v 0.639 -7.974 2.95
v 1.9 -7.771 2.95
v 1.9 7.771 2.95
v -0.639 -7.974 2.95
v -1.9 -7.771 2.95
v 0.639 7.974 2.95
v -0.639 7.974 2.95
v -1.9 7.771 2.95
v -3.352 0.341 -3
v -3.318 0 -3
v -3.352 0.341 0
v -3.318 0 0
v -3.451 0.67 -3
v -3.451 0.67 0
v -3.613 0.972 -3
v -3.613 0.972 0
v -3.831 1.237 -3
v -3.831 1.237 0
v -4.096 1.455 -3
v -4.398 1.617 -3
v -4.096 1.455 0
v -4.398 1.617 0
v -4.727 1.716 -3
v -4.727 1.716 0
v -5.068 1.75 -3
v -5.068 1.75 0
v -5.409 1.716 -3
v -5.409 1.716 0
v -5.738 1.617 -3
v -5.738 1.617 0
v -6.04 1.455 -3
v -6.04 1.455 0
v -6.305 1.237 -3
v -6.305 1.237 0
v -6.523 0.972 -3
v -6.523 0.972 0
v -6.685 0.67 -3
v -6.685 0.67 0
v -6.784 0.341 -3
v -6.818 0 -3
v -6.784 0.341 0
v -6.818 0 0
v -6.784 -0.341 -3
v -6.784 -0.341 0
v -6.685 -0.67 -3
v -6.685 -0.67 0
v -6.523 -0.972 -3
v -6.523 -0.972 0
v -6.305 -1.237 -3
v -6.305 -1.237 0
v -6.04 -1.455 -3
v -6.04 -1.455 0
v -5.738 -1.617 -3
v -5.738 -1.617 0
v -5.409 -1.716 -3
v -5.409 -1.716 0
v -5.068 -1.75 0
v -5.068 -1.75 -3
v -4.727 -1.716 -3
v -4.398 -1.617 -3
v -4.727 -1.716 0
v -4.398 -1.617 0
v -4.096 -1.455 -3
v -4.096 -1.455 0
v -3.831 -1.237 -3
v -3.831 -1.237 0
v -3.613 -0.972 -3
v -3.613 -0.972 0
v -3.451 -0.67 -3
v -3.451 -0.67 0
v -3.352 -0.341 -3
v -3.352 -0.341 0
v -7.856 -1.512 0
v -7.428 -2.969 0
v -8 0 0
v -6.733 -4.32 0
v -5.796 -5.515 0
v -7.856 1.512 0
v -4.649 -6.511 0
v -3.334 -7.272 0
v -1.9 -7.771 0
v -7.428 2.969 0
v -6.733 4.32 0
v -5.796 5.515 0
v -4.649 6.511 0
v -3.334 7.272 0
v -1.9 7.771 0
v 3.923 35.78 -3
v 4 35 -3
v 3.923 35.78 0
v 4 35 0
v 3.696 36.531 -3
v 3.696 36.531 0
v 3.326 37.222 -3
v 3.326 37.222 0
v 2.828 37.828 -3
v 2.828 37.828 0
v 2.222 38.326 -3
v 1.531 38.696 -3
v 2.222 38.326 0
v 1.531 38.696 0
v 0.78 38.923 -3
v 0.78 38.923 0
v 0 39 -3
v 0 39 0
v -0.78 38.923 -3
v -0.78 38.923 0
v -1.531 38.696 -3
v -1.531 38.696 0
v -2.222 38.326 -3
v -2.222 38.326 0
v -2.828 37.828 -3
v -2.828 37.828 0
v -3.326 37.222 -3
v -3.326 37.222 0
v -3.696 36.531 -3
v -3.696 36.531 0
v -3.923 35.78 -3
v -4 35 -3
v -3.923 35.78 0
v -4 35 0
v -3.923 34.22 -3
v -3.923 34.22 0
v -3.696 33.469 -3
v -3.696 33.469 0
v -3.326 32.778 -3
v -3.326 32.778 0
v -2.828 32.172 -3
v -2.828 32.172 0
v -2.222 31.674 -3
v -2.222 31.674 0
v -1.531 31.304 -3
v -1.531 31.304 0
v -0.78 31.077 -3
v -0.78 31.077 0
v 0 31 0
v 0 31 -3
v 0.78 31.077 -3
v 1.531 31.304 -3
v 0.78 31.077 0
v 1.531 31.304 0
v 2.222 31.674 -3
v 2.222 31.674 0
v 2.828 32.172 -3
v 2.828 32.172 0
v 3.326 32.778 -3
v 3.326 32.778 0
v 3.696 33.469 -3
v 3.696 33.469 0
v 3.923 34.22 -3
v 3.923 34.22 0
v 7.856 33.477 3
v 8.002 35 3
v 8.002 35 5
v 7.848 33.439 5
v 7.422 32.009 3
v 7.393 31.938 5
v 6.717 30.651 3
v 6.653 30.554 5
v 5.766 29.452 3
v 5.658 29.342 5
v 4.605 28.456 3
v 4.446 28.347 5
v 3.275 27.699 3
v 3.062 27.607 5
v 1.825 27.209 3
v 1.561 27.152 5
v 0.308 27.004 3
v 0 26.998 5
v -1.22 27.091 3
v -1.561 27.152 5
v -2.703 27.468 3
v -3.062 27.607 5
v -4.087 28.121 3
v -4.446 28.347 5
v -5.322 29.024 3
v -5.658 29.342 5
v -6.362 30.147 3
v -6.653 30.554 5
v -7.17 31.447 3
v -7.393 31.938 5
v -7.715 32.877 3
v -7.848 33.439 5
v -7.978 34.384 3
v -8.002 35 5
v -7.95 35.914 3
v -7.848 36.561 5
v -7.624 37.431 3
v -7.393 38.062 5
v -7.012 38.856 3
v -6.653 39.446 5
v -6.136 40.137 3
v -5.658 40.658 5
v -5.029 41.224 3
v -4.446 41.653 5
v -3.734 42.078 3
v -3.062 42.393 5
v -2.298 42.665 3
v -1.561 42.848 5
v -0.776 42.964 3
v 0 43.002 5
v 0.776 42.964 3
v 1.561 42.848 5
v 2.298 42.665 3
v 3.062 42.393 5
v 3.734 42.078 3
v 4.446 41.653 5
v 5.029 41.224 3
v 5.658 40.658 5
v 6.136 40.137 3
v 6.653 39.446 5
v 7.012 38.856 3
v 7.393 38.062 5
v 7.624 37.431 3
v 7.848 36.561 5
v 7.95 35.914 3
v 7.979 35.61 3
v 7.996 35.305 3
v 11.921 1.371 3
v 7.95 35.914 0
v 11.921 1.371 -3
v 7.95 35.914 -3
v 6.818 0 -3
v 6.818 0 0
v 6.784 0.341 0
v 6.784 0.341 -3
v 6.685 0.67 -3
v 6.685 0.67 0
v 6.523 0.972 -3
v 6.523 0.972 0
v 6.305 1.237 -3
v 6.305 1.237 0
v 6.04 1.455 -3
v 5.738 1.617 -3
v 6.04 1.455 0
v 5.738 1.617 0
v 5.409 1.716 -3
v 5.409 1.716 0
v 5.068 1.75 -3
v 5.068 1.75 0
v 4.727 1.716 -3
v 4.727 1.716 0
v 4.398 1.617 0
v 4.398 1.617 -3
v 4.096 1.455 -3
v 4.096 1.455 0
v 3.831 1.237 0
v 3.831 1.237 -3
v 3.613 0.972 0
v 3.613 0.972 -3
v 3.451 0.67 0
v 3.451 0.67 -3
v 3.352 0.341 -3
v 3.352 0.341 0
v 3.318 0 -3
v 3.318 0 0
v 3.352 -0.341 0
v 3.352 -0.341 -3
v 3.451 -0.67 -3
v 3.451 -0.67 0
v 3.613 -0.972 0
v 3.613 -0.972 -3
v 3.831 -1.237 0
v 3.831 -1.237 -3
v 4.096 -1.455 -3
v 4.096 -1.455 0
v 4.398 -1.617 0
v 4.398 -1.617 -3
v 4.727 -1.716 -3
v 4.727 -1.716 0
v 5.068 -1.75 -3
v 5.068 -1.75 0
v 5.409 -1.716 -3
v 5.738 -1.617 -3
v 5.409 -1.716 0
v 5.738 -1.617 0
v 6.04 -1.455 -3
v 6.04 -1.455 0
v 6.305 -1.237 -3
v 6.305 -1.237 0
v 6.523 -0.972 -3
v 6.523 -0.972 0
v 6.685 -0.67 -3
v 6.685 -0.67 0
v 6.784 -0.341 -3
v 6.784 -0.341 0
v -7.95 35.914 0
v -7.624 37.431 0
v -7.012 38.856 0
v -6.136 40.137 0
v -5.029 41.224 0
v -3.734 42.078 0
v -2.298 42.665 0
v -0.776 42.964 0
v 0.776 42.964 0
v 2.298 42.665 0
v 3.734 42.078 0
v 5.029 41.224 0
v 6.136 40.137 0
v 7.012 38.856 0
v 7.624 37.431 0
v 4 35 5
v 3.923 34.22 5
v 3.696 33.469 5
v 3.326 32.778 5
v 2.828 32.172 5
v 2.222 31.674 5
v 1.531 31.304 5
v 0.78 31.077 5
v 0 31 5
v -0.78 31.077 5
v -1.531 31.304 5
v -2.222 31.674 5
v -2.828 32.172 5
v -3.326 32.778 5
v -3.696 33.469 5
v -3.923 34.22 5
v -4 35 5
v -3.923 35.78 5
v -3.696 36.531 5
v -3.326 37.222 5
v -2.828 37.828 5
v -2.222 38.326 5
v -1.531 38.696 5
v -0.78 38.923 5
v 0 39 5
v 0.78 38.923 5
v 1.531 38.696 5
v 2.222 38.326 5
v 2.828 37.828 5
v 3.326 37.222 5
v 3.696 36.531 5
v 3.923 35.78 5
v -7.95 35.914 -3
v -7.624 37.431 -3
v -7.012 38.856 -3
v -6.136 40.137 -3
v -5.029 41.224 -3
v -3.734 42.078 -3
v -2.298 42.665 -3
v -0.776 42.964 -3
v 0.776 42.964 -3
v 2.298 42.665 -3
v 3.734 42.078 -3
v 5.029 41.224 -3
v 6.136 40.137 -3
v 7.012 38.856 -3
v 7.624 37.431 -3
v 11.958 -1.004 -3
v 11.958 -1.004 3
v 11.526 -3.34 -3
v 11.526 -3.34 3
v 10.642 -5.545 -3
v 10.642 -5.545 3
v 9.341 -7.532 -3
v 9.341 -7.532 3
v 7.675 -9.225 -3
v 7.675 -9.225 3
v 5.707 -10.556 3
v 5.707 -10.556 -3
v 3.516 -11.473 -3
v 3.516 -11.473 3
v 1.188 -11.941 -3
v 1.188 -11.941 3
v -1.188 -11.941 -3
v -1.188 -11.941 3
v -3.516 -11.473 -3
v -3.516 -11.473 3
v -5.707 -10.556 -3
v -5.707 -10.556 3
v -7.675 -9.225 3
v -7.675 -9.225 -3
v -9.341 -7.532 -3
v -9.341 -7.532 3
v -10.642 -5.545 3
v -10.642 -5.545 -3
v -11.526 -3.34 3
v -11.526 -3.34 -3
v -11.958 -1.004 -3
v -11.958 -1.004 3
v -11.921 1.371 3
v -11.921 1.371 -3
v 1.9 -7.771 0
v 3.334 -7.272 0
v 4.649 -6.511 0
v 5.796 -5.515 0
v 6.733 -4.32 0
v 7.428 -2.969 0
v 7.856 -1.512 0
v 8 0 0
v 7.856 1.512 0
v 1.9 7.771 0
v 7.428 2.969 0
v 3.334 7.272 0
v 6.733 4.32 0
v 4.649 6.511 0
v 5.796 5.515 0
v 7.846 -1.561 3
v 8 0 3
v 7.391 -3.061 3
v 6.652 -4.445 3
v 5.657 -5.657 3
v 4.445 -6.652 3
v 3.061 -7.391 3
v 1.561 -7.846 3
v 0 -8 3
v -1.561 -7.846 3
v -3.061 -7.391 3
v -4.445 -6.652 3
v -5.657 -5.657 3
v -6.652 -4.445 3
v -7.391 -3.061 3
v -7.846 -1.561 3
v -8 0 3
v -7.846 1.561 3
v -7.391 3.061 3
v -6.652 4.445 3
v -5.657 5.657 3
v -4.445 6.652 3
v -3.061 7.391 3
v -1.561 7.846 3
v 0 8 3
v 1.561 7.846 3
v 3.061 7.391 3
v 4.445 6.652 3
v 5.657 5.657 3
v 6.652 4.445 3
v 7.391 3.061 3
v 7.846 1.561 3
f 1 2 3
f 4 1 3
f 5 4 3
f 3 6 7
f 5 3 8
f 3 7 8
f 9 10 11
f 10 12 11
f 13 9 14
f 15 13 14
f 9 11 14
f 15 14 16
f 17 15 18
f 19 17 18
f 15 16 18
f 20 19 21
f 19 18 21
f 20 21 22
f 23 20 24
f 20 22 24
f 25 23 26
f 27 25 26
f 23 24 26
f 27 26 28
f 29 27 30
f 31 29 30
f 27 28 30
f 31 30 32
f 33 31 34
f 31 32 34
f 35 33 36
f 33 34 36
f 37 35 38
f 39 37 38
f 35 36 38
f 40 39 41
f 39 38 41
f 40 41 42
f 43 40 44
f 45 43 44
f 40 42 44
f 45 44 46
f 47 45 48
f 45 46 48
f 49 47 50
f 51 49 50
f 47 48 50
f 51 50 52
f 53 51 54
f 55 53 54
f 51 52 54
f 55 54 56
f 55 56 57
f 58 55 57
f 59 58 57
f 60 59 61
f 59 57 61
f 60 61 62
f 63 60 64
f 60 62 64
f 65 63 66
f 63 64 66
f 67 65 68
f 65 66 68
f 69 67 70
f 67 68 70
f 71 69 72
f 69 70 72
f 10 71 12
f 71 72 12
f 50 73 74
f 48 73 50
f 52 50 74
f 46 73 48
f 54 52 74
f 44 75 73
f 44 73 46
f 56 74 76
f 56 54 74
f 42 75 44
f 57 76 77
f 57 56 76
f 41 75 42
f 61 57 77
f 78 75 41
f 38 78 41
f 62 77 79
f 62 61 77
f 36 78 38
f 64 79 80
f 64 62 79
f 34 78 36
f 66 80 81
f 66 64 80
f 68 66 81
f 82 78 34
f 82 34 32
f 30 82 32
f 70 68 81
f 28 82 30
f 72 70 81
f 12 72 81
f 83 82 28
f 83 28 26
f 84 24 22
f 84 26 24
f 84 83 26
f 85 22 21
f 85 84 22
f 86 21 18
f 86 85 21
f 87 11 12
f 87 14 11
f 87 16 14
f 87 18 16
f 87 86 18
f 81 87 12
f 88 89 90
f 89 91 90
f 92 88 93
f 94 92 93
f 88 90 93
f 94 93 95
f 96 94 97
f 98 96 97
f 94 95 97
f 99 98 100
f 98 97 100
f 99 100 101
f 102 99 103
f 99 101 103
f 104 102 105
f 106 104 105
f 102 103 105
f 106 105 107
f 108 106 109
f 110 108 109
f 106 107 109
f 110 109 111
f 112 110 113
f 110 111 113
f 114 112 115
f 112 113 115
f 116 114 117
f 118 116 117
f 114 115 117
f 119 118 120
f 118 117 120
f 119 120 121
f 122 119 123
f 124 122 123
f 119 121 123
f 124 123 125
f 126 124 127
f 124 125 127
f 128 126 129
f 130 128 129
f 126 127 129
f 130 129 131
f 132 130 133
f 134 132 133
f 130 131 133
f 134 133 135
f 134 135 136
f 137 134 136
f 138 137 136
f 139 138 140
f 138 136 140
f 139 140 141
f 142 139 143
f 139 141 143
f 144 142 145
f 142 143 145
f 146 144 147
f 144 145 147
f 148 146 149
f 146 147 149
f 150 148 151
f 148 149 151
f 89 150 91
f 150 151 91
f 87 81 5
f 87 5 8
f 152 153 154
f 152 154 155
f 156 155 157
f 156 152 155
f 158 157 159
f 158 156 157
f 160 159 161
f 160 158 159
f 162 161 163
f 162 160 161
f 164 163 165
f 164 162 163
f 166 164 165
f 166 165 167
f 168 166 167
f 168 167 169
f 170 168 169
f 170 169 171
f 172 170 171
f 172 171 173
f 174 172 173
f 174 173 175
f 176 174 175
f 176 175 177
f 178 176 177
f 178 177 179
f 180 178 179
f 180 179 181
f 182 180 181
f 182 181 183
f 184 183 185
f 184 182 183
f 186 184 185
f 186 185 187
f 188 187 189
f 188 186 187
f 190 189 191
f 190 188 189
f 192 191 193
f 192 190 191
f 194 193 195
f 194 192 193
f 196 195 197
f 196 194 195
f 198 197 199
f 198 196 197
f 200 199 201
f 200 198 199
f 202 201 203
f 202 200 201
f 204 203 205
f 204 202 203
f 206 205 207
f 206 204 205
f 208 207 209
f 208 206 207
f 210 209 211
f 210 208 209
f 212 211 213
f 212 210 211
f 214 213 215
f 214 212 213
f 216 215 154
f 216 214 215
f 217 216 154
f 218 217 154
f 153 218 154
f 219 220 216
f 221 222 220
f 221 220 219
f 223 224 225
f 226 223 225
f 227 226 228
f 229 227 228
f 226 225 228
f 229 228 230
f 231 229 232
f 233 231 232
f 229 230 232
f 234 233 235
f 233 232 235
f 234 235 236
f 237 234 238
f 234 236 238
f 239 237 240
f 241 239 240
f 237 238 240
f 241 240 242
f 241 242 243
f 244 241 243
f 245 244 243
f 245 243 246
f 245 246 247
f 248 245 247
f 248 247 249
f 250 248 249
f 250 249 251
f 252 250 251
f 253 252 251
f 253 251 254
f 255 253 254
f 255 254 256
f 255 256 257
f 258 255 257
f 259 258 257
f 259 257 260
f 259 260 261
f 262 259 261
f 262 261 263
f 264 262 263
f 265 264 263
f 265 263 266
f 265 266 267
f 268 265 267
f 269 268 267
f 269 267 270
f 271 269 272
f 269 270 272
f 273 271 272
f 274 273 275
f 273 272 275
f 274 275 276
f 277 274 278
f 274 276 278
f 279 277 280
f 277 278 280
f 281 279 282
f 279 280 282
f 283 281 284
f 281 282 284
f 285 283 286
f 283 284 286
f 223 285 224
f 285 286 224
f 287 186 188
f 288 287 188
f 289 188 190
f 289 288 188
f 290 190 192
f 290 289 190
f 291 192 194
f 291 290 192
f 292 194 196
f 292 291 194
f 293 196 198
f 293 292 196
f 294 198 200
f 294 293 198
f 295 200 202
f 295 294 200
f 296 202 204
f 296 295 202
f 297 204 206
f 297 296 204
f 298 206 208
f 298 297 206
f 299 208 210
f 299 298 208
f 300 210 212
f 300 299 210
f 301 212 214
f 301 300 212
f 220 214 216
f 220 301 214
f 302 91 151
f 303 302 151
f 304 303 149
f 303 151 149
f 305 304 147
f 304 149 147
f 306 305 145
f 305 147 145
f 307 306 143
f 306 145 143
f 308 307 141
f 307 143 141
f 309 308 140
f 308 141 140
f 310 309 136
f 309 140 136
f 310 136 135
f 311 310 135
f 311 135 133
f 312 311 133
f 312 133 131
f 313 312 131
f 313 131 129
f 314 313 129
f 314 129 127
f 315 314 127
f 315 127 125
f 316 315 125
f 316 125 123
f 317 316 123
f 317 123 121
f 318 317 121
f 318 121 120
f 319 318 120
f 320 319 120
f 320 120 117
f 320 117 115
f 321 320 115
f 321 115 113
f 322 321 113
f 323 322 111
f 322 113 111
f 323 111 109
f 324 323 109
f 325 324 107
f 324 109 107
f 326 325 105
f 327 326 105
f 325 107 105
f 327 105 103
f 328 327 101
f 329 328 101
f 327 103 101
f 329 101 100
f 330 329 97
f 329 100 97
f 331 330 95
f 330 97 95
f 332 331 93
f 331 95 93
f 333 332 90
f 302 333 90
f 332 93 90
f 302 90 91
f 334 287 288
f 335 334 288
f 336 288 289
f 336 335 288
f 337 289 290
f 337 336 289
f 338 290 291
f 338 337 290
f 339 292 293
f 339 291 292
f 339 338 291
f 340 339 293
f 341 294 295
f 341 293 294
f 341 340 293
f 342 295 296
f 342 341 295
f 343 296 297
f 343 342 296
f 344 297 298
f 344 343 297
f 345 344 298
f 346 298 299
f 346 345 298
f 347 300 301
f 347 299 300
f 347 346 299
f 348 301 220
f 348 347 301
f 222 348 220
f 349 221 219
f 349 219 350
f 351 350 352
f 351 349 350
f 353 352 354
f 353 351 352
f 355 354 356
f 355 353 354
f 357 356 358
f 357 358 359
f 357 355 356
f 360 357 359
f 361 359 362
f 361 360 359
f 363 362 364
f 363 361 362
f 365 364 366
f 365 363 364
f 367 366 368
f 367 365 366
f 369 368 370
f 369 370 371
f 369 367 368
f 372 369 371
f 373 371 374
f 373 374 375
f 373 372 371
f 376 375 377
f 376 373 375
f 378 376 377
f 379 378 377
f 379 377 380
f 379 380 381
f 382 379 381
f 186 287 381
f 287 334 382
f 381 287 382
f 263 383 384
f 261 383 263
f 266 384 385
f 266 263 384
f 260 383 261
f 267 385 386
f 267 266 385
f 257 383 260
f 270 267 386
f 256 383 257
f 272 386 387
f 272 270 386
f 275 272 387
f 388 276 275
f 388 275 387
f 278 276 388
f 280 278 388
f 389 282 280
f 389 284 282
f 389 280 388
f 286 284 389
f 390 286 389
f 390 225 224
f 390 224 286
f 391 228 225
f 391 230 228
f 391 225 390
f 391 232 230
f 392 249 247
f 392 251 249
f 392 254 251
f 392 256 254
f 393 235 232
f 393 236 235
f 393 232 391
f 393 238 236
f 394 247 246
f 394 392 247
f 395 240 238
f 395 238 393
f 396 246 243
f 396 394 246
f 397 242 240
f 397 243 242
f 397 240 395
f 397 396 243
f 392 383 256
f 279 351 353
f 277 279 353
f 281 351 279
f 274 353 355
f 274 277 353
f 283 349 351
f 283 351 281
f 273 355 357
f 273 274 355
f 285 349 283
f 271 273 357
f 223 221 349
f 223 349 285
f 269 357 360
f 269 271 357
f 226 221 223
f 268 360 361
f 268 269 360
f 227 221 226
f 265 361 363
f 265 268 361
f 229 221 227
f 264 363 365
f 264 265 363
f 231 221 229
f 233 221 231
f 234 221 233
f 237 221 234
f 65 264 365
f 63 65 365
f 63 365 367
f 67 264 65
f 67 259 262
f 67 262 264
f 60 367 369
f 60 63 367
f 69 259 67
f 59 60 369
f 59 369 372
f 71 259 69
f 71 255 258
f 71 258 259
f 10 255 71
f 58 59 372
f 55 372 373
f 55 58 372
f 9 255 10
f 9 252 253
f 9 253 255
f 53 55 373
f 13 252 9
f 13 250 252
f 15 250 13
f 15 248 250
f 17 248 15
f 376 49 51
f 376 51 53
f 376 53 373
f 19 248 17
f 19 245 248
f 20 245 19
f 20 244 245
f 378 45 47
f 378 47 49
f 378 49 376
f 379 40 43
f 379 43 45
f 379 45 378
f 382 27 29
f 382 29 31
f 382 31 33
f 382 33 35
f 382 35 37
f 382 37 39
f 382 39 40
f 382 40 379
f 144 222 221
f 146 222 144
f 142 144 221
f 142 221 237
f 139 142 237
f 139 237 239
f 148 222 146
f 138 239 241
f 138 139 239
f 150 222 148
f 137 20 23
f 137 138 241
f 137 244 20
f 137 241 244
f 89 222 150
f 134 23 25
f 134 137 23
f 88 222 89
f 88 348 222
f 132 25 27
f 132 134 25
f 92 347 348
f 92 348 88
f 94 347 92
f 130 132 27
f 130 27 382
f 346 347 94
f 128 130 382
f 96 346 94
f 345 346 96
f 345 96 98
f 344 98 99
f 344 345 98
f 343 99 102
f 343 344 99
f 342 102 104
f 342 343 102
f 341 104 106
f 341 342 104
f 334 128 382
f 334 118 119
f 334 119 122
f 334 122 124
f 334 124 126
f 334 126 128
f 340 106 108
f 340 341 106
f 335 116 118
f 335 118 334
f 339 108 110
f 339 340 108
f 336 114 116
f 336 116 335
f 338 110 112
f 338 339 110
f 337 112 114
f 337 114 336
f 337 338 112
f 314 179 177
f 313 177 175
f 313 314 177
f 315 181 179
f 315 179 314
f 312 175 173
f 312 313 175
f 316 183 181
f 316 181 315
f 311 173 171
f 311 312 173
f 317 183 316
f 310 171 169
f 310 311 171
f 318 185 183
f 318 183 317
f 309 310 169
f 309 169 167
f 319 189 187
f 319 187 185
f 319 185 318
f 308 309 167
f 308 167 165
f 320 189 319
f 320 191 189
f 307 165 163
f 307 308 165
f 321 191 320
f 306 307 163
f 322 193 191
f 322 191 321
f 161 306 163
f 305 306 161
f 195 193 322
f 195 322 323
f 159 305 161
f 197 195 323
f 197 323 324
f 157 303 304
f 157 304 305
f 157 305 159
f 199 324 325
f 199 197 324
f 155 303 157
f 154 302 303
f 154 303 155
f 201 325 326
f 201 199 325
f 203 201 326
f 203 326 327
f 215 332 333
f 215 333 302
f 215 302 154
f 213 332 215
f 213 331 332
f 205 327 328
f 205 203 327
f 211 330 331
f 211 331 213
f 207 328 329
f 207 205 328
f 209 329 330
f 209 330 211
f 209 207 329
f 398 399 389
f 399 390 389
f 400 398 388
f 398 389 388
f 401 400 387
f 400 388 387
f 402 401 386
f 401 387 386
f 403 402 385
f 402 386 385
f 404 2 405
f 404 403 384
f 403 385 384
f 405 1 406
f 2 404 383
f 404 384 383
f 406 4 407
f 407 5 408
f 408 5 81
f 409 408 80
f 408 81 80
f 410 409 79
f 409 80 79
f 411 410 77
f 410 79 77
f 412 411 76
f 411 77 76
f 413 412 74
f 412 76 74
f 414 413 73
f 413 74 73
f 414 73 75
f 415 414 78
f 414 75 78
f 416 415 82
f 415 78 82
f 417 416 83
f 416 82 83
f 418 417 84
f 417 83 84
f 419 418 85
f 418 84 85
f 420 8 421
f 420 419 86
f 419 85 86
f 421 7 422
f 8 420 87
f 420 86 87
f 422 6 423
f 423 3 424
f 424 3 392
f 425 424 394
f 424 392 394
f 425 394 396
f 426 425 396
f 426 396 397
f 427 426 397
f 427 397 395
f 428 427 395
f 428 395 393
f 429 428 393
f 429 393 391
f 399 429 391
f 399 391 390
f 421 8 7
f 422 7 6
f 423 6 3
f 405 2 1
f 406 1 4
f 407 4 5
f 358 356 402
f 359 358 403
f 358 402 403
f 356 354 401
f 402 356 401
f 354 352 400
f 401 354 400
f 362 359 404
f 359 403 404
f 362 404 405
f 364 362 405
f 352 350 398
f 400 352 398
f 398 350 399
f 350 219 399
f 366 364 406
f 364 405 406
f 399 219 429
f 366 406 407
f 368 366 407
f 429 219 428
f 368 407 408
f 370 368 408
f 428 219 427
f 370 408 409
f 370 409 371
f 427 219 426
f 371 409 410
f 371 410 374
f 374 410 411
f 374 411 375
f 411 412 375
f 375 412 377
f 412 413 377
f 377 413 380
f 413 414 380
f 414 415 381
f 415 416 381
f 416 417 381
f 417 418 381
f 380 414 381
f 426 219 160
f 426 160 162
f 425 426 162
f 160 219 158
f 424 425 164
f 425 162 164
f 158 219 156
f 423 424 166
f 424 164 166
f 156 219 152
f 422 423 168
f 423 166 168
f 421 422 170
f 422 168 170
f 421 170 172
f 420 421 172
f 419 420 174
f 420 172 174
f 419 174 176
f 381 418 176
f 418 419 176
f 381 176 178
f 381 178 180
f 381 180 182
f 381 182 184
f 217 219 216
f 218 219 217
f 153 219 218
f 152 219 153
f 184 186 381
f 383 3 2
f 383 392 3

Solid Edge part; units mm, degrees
sketch "Sketch1" plane through (0, 0, 0) normal (0, 0, 1) x (1, 0, 0)
  line L0 (7.9496, 35.9141) -> (11.9215, 1.3707)
  line L1 (-7.9496, 35.9141) -> (-11.9215, 1.3707)
  arc A0 (11.9215, 1.3707) -> (-11.9215, 1.3707) centre (0, 0) cw
  arc A1 (-7.9496, 35.9141) -> (7.9496, 35.9141) centre (0, 35) cw
extrude "Protrusion1" add sketch "Sketch1" along normal mid plane 6
sketch "Sketch2" plane through (0, 0, 0) normal (0, 0, 1) x (1, 0, 0)
  circle A0 centre (0, 0) radius 8
extrude "ExtrudedCutout_1" cut sketch "Sketch2" along normal blind 28.5335
sketch "Sketch3" plane through (0, 0, 0) normal (0, 0, 1) x (1, 0, 0)
  circle A0 centre (-5.068, 0) radius 1.75
  circle A1 centre (5.068, 0) radius 1.75
extrude "ExtrudedCutout_2" cut sketch "Sketch3" along normal mid plane 265.7863
sketch "Sketch4" plane through (0, 0, 0) normal (0, 0, 1) x (1, 0, 0)
  circle A0 centre (0, 35) radius 4
extrude "ExtrudedCutout_3" cut sketch "Sketch4" along normal mid plane 190.7262
sketch "Sketch5" plane through (0, 0, 0) normal (0, 0, 1) x (1, 0, 0)
  circle A0 centre (0, 35) radius 8.002
extrude "ExtrudedProtrusion_2" add sketch "Sketch5" along normal blind 5
sketch "Sketch6" plane through (0, 0, 0) normal (0, 0, 1) x (1, 0, 0)
  circle A0 centre (0, 35) radius 4
extrude "ExtrudedCutout_4" cut sketch "Sketch6" along normal mid plane 58.2949
sketch "Sketch7" plane through (0, 0, 0) normal (0, 0, 1) x (1, 0, 0)
  line L0 (-1.9, 8.5724) -> (1.9, 8.5724)
  line L1 (1.9, 8.5724) -> (1.9, -8.5724)
  line L2 (1.9, -8.5724) -> (-1.9, -8.5724)
  line L3 (-1.9, -8.5724) -> (-1.9, 8.5724)
extrude "ExtrudedProtrusion_4" add sketch "Sketch7" along normal blind 2.95
